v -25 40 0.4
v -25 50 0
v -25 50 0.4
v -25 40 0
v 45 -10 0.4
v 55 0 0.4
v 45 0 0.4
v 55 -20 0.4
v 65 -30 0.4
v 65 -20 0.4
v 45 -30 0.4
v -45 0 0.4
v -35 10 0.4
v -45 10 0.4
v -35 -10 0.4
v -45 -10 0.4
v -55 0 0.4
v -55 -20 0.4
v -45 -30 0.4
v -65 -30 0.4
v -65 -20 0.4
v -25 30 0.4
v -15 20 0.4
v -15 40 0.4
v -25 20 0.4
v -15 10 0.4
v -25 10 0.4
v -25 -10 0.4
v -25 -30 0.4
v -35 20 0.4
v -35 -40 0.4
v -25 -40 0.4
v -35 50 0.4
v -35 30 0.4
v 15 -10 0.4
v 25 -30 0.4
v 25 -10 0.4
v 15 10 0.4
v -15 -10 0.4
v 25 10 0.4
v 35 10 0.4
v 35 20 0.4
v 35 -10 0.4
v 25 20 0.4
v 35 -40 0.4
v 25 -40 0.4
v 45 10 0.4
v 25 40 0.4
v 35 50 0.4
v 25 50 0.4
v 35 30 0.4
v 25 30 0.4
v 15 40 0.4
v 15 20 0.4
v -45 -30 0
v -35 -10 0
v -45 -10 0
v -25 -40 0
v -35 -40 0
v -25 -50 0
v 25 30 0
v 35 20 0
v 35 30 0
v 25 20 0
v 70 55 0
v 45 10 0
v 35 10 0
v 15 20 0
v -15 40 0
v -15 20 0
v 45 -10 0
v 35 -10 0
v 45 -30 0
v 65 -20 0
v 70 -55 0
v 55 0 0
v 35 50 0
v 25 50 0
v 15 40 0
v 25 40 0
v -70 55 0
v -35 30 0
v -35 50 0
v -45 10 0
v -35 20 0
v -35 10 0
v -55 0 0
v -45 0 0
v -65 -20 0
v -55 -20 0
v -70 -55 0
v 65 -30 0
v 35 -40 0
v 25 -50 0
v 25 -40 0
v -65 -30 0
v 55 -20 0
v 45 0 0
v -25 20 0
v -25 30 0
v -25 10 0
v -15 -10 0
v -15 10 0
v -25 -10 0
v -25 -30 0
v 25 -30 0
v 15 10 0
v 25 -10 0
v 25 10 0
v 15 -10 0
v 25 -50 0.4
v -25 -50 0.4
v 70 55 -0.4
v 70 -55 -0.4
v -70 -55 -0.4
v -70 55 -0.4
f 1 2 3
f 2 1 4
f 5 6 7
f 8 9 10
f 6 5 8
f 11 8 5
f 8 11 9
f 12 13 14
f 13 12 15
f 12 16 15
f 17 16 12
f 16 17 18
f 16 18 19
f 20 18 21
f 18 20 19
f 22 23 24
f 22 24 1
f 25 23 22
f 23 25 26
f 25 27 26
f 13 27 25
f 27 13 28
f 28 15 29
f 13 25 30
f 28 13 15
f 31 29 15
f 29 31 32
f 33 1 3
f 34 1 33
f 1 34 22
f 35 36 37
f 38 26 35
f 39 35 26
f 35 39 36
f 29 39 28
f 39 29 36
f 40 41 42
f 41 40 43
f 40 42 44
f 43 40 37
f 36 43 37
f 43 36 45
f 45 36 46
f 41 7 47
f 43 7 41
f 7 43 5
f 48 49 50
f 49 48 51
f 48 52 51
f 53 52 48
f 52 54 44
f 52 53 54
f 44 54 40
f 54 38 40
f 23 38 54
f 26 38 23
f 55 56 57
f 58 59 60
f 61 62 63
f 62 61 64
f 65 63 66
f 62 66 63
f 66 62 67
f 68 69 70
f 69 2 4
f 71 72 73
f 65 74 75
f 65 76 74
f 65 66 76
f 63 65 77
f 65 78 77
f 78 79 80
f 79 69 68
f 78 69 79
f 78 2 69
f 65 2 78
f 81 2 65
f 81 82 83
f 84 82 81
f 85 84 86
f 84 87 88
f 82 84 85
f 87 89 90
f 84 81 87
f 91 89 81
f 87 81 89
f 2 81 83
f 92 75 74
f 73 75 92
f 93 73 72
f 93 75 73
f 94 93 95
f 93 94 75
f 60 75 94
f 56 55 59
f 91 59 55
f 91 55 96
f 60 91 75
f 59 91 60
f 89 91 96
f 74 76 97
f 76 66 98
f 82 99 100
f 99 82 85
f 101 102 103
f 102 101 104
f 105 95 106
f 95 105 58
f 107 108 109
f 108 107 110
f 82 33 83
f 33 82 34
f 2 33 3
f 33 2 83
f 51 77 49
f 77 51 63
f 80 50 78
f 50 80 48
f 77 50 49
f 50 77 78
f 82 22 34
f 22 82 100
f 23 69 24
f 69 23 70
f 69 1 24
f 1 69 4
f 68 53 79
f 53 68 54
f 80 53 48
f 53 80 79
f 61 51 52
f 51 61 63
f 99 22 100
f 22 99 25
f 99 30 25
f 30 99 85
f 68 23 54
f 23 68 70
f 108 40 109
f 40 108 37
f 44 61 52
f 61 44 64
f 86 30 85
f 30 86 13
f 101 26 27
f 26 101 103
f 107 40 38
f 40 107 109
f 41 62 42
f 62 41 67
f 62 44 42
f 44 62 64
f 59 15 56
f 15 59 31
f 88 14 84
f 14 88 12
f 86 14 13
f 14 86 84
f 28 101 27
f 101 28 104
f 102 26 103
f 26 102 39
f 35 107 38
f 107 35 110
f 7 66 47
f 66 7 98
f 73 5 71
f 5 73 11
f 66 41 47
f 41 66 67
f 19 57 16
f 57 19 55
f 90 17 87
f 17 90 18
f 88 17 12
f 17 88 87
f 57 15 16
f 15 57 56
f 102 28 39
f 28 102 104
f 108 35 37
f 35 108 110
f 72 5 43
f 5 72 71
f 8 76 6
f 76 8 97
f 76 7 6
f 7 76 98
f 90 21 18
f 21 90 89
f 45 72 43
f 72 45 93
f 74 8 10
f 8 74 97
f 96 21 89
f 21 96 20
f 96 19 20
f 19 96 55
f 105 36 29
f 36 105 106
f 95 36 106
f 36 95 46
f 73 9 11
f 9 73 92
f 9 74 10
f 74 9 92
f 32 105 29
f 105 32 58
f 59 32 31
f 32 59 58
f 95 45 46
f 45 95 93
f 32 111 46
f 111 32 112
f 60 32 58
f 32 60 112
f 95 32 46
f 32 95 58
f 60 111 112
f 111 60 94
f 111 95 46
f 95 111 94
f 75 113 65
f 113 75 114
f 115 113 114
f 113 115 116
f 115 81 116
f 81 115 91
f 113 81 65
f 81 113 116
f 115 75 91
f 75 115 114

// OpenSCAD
step = 0.4;   // height of steps
size = 10;  // width of squares
base = 1;   // 0/1 for off/on

colors = ["black", "white"];

file =              // this is the image you create
[[0, 0, 0, 1, 0, 0, 0, 0, 0, 1, 0, 0, 0],   // '0' for 'empty/none'
[0, 0, 0, 1, 1, 0, 0, 0, 1, 1, 0, 0, 0],
[0, 0, 0, 0, 1, 0, 0, 0, 1, 0, 0, 0, 0],
[0, 0, 0, 1, 1, 1, 1, 1, 1, 1, 0, 0, 0],
[0, 0, 1, 1, 0, 1, 1, 1, 0, 1, 1, 0, 0],
[0, 1, 1, 1, 0, 1, 1, 1, 0, 1, 1, 1, 0],
[0, 1, 0, 1, 1, 1, 1, 1, 1, 1, 0, 1, 0],
[1, 1, 0, 1, 1, 1, 1, 1, 1, 1, 0, 1, 1],
[0, 0, 0, 1, 0, 0, 0, 0, 0, 1, 0, 0, 0],
[0, 0, 0, 0, 1, 1, 1, 1, 1, 0, 0, 0, 0]];

translate([-len(file[0])*size/2, len(file)*size/2])
for (i = [0 :len(file)-1], j = [0 : len(file[0])-1])
    translate([j, -i-1, 0]*size) 
        color(colors[ (file[i][j] -1) %len(colors) ]) 
            cube([size, size, step * file[i][j]], false);

if (base == 1) 
    translate([0, 0, -step/2]) 
cube([(len(file[0])+1)*size, (len(file)+1)*size, step], true);
